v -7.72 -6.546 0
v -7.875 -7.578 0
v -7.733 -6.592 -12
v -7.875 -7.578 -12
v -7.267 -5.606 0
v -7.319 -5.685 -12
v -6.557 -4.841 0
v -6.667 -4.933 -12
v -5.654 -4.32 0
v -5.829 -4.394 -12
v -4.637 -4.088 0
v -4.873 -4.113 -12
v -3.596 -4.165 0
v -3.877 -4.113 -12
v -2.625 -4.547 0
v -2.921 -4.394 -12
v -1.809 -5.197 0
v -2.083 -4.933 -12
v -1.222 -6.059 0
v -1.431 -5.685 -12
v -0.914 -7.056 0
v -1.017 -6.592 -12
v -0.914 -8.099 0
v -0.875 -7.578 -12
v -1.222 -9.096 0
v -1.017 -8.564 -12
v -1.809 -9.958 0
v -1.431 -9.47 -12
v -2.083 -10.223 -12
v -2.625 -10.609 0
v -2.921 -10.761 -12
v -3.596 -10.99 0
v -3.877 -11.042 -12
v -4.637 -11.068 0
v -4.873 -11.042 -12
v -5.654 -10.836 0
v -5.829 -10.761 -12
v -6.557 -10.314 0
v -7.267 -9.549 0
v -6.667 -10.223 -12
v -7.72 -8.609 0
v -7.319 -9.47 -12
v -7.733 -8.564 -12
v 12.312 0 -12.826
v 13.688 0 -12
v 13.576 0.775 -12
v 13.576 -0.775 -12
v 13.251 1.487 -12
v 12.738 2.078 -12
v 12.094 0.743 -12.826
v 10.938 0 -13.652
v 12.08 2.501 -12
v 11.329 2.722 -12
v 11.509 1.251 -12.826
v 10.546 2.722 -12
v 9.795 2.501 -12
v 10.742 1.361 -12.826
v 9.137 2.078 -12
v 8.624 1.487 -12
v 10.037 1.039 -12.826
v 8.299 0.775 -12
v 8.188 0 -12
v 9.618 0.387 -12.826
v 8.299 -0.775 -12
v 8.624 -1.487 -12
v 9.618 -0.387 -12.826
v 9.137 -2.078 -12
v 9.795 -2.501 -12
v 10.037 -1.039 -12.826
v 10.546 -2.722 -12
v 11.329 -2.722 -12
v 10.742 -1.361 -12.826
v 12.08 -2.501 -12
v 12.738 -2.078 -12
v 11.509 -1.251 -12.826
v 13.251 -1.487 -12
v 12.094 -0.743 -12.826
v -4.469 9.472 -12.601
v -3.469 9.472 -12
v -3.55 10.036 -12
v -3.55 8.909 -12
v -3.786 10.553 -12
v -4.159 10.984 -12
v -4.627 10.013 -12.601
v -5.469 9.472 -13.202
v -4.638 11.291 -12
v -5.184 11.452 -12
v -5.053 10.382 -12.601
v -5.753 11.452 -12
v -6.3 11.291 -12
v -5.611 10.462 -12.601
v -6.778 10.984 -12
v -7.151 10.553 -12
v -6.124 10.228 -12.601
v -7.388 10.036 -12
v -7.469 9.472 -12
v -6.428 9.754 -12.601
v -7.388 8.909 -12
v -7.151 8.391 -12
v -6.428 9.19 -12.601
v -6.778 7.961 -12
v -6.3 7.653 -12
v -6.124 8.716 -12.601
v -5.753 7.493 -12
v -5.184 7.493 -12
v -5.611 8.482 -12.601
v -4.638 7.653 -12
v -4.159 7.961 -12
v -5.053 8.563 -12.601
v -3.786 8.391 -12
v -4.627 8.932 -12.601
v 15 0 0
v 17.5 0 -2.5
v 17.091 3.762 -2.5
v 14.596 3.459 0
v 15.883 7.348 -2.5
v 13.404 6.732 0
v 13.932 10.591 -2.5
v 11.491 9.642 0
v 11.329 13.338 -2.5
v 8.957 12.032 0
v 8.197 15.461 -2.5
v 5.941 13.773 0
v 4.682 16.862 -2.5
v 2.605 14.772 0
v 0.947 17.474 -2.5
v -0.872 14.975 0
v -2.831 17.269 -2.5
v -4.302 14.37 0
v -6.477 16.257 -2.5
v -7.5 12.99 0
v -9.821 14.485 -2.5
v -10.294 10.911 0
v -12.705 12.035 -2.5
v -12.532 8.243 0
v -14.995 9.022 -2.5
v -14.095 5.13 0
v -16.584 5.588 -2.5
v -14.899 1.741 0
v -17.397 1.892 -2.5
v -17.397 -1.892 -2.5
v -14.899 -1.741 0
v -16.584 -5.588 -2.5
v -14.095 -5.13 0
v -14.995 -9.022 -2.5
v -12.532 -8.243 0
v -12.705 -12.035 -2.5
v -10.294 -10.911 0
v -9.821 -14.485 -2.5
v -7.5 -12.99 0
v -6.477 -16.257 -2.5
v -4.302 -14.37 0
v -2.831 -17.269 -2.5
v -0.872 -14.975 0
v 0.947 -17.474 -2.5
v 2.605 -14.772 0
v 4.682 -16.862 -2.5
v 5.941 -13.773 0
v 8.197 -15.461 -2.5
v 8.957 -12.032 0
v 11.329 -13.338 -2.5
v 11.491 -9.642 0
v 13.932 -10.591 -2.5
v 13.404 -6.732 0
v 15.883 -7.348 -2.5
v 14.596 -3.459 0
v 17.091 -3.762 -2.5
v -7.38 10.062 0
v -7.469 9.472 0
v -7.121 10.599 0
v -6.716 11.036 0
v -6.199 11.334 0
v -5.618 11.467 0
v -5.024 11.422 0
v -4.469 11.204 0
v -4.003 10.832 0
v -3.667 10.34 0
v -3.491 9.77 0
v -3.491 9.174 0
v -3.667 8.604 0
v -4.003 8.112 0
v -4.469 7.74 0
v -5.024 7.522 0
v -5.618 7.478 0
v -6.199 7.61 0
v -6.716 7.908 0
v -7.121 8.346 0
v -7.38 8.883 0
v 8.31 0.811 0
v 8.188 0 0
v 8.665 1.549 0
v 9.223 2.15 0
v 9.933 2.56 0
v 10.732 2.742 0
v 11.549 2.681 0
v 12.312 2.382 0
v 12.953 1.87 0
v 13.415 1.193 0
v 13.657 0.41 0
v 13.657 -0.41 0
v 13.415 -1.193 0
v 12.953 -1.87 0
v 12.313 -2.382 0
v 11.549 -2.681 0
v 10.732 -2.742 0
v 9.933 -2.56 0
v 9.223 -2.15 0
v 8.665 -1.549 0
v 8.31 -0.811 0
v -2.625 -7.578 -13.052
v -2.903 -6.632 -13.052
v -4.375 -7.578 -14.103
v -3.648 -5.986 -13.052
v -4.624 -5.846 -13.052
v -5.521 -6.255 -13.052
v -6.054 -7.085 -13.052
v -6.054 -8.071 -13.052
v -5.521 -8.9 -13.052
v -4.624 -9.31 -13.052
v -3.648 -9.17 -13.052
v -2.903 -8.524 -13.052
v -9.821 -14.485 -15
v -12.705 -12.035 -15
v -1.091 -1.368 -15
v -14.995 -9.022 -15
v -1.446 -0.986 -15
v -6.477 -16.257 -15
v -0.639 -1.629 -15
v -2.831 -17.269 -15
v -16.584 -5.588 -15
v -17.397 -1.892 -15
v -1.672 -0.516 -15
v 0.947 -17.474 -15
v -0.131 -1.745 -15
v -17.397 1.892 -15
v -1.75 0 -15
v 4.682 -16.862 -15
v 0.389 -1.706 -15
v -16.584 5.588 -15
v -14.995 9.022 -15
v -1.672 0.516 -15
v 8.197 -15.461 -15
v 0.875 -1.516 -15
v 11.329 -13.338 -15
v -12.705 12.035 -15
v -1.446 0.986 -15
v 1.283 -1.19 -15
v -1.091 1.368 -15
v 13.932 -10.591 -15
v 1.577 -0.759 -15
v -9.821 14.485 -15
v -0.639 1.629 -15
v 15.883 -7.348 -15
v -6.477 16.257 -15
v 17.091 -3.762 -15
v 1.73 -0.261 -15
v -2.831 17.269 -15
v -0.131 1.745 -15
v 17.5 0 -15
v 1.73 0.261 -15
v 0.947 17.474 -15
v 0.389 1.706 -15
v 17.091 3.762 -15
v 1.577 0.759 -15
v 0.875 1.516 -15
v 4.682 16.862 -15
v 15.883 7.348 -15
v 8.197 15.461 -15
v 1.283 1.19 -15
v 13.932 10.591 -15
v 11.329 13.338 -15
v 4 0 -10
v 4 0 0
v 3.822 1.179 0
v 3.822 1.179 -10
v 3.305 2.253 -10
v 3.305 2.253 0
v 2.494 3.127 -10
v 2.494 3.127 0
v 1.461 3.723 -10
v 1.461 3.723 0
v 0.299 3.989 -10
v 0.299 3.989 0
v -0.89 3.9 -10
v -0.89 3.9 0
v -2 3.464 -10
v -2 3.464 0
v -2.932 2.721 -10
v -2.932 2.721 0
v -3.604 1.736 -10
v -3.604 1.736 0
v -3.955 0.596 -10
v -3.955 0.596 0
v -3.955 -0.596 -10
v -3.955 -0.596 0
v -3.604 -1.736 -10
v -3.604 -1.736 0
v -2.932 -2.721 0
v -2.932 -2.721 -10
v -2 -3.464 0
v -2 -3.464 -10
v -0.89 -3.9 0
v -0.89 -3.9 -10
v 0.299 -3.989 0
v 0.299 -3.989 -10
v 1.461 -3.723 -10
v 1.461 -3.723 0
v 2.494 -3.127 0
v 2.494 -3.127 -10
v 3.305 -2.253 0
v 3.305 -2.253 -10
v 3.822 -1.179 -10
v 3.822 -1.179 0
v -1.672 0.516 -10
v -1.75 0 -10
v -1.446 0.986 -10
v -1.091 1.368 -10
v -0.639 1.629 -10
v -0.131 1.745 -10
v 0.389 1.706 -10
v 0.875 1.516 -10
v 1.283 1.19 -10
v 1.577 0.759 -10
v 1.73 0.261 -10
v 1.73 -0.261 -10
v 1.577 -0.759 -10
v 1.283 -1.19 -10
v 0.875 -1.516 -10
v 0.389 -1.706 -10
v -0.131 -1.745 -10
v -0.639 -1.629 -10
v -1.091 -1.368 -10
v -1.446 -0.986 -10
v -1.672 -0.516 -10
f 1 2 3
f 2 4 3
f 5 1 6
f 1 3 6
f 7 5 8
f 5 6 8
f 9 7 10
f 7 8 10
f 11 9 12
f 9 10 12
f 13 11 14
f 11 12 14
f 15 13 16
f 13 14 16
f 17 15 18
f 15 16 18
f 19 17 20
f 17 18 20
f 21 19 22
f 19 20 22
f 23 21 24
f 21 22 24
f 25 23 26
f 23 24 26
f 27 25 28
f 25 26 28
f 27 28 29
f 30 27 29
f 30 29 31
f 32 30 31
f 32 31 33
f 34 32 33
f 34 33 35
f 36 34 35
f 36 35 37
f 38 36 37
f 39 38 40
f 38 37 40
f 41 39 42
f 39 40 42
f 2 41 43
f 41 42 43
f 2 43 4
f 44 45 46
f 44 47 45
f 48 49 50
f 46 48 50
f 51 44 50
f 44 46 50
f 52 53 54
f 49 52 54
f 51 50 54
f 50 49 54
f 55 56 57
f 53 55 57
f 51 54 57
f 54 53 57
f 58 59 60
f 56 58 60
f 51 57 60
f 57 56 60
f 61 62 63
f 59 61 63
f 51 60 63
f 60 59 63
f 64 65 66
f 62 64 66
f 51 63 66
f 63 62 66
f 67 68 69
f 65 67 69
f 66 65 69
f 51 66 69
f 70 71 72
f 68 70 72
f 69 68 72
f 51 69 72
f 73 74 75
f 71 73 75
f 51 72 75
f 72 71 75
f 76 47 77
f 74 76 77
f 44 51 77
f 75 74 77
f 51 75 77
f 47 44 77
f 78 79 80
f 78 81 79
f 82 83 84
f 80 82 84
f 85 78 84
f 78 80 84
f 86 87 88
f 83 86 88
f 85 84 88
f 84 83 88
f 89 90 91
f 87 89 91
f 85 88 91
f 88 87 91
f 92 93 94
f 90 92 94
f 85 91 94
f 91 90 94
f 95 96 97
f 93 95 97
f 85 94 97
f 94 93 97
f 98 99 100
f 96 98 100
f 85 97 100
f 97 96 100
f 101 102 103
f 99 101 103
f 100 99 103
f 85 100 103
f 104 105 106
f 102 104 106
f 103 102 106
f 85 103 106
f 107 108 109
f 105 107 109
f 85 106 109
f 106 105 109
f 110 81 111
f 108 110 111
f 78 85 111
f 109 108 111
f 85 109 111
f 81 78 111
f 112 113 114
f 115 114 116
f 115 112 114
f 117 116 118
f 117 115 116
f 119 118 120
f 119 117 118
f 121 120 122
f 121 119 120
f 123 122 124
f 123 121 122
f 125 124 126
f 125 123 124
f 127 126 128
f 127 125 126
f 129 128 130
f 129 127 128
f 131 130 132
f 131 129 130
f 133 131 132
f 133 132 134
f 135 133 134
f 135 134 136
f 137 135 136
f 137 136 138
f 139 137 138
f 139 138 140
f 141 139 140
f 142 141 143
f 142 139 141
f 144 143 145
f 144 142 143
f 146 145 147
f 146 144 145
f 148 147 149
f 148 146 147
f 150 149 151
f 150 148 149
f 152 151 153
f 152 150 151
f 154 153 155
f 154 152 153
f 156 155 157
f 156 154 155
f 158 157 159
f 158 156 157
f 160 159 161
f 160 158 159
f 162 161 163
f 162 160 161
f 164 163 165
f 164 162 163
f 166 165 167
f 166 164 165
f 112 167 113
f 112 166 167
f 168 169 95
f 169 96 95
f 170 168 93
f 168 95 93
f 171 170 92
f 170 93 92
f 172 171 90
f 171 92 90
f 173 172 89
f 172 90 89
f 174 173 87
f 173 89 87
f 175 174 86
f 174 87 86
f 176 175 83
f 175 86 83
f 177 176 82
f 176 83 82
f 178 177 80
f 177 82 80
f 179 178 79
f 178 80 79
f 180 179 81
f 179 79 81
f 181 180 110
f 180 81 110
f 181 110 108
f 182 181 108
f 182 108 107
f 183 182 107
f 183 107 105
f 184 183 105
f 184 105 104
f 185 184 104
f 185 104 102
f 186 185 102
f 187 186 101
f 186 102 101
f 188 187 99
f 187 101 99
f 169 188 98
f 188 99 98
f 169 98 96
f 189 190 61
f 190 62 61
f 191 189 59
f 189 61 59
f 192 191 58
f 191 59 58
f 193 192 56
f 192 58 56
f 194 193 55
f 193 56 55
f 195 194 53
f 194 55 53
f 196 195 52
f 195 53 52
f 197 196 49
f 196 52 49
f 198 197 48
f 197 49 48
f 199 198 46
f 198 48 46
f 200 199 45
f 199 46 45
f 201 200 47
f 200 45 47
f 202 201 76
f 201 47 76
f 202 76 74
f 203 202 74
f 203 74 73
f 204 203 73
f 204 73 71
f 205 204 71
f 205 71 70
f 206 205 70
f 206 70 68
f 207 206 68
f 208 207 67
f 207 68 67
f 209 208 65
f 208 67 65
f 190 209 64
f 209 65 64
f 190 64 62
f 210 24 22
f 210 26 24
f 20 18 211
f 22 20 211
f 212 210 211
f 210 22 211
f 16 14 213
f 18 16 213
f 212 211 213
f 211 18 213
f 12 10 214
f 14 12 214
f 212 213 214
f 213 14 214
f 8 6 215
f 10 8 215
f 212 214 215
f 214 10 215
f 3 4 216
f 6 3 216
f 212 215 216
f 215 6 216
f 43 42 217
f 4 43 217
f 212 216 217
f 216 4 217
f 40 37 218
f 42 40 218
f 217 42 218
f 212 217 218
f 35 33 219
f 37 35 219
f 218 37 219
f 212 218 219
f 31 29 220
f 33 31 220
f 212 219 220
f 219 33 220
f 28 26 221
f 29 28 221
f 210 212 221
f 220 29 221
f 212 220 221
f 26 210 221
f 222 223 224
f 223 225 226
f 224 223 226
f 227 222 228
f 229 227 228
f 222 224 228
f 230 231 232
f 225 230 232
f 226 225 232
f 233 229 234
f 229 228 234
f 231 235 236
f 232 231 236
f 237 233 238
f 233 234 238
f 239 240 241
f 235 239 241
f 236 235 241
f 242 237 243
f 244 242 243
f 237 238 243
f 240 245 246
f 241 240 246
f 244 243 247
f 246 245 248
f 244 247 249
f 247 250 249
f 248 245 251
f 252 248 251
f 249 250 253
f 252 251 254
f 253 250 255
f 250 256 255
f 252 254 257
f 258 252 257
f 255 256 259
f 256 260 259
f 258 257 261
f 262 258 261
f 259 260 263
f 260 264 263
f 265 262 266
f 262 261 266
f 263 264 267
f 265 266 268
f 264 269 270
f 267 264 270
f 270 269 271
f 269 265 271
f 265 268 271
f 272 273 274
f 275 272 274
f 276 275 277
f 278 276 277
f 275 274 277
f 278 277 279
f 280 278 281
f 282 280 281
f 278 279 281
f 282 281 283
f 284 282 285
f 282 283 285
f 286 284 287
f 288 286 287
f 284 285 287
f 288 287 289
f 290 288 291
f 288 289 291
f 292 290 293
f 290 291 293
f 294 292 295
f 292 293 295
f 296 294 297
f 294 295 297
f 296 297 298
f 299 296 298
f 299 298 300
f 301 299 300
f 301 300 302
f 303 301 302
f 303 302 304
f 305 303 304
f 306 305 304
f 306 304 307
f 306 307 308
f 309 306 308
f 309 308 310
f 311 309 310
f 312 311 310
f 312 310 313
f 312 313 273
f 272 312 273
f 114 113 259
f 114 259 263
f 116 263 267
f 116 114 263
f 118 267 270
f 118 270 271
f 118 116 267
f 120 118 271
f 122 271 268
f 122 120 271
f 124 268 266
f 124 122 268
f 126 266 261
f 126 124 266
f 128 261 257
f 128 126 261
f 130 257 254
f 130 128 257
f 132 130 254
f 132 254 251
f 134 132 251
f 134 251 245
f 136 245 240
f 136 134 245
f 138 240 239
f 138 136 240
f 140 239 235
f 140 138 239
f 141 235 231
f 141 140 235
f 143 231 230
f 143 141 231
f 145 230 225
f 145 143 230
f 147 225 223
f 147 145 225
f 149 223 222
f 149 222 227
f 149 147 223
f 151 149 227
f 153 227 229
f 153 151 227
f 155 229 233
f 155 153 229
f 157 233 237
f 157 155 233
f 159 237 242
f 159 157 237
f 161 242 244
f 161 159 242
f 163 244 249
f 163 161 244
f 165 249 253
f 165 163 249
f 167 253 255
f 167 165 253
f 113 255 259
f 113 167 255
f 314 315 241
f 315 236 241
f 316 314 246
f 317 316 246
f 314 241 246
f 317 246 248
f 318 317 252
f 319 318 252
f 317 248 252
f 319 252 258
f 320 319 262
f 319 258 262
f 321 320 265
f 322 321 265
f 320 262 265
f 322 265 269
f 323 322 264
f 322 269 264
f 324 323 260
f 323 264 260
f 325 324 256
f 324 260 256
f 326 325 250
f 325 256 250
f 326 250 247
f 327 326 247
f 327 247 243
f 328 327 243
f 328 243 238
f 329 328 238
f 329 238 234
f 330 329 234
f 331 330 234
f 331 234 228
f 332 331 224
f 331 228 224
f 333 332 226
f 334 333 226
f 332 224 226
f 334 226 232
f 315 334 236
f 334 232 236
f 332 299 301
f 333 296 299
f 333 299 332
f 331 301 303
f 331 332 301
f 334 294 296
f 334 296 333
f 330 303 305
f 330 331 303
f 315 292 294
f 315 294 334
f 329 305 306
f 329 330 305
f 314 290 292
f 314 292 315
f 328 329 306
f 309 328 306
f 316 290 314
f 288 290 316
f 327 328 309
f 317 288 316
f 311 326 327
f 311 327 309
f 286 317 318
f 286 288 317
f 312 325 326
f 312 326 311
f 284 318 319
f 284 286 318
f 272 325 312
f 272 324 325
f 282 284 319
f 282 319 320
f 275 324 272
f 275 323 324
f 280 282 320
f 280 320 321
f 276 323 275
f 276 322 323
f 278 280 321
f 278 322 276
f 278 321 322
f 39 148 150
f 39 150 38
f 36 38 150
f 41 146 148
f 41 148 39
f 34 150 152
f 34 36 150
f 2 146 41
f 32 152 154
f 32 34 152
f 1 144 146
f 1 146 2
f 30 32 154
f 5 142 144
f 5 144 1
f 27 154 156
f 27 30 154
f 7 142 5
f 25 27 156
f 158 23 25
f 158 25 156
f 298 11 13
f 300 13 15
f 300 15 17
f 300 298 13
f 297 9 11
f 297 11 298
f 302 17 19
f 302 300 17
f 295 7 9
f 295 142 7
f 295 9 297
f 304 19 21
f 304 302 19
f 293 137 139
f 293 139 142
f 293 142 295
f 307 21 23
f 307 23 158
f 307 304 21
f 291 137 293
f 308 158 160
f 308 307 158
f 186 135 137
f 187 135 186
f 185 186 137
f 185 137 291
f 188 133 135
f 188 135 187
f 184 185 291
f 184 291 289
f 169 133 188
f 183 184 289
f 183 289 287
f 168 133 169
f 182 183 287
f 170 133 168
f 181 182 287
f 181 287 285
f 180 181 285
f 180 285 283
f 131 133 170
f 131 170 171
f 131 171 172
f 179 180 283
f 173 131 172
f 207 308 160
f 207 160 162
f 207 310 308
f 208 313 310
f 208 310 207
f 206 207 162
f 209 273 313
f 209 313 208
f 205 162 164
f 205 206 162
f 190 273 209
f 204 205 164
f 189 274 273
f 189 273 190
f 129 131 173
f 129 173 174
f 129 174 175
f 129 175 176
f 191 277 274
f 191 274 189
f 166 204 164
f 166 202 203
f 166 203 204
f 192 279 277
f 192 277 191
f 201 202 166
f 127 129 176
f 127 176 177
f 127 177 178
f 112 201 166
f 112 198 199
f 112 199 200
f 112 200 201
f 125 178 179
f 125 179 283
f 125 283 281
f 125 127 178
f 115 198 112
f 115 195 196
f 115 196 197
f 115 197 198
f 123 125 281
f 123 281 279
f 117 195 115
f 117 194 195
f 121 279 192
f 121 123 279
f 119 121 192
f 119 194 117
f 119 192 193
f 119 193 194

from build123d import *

# Parameters (mm, degrees)
F0_R           = 17.5
F1_DEPTH       = 15
F2_D           = 5.5
F2_DEPTH       = 12
F2_TIP         = 1.6523667023
F3_D           = 7
F3_DEPTH       = 12
F3_TIP         = 2.1030121666
F4_D           = 4
F4_DEPTH       = 12
F4_TIP         = 1.2017212381
F5_D           = 3.5
F5_CBORE_D     = 8
F5_CBORE_DEPTH = 10
F6_SIZE        = 2.5


with BuildPart() as f1:
    # F0 (on Top) → F1 (new body)
    with BuildSketch(Plane.XY):
        Circle(F0_R)
    extrude(amount=-F1_DEPTH)

    # F2
    with Locations(Plane.XY):
        with Locations((10.9375, 0)):
            Hole(F2_D / 2, depth=F2_DEPTH)
            with Locations((0, 0, -(F2_DEPTH + F2_TIP / 2))):  # 118° drill point
                Cone(0, F2_D / 2, F2_TIP, mode=Mode.SUBTRACT)

    # F3
    with Locations(Plane.XY):
        with Locations((-4.375, -7.5777222831)):
            Hole(F3_D / 2, depth=F3_DEPTH)
            with Locations((0, 0, -(F3_DEPTH + F3_TIP / 2))):  # 118° drill point
                Cone(0, F3_D / 2, F3_TIP, mode=Mode.SUBTRACT)

    # F4
    with Locations(Plane.XY):
        with Locations((-5.46875, 9.4721528539)):
            Hole(F4_D / 2, depth=F4_DEPTH)
            with Locations((0, 0, -(F4_DEPTH + F4_TIP / 2))):  # 118° drill point
                Cone(0, F4_D / 2, F4_TIP, mode=Mode.SUBTRACT)

    # F5 (through all)
    with Locations(Plane.XY):
        with Locations((0, 0)):
            CounterBoreHole(F5_D / 2, F5_CBORE_D / 2, F5_CBORE_DEPTH)

    # F6
    f6_edges = [f1.edges().sort_by_distance(p)[0] for p in [
        (-17.5, 0, 0),
    ]]
    chamfer(f6_edges, length=F6_SIZE)


solid = f1.part
